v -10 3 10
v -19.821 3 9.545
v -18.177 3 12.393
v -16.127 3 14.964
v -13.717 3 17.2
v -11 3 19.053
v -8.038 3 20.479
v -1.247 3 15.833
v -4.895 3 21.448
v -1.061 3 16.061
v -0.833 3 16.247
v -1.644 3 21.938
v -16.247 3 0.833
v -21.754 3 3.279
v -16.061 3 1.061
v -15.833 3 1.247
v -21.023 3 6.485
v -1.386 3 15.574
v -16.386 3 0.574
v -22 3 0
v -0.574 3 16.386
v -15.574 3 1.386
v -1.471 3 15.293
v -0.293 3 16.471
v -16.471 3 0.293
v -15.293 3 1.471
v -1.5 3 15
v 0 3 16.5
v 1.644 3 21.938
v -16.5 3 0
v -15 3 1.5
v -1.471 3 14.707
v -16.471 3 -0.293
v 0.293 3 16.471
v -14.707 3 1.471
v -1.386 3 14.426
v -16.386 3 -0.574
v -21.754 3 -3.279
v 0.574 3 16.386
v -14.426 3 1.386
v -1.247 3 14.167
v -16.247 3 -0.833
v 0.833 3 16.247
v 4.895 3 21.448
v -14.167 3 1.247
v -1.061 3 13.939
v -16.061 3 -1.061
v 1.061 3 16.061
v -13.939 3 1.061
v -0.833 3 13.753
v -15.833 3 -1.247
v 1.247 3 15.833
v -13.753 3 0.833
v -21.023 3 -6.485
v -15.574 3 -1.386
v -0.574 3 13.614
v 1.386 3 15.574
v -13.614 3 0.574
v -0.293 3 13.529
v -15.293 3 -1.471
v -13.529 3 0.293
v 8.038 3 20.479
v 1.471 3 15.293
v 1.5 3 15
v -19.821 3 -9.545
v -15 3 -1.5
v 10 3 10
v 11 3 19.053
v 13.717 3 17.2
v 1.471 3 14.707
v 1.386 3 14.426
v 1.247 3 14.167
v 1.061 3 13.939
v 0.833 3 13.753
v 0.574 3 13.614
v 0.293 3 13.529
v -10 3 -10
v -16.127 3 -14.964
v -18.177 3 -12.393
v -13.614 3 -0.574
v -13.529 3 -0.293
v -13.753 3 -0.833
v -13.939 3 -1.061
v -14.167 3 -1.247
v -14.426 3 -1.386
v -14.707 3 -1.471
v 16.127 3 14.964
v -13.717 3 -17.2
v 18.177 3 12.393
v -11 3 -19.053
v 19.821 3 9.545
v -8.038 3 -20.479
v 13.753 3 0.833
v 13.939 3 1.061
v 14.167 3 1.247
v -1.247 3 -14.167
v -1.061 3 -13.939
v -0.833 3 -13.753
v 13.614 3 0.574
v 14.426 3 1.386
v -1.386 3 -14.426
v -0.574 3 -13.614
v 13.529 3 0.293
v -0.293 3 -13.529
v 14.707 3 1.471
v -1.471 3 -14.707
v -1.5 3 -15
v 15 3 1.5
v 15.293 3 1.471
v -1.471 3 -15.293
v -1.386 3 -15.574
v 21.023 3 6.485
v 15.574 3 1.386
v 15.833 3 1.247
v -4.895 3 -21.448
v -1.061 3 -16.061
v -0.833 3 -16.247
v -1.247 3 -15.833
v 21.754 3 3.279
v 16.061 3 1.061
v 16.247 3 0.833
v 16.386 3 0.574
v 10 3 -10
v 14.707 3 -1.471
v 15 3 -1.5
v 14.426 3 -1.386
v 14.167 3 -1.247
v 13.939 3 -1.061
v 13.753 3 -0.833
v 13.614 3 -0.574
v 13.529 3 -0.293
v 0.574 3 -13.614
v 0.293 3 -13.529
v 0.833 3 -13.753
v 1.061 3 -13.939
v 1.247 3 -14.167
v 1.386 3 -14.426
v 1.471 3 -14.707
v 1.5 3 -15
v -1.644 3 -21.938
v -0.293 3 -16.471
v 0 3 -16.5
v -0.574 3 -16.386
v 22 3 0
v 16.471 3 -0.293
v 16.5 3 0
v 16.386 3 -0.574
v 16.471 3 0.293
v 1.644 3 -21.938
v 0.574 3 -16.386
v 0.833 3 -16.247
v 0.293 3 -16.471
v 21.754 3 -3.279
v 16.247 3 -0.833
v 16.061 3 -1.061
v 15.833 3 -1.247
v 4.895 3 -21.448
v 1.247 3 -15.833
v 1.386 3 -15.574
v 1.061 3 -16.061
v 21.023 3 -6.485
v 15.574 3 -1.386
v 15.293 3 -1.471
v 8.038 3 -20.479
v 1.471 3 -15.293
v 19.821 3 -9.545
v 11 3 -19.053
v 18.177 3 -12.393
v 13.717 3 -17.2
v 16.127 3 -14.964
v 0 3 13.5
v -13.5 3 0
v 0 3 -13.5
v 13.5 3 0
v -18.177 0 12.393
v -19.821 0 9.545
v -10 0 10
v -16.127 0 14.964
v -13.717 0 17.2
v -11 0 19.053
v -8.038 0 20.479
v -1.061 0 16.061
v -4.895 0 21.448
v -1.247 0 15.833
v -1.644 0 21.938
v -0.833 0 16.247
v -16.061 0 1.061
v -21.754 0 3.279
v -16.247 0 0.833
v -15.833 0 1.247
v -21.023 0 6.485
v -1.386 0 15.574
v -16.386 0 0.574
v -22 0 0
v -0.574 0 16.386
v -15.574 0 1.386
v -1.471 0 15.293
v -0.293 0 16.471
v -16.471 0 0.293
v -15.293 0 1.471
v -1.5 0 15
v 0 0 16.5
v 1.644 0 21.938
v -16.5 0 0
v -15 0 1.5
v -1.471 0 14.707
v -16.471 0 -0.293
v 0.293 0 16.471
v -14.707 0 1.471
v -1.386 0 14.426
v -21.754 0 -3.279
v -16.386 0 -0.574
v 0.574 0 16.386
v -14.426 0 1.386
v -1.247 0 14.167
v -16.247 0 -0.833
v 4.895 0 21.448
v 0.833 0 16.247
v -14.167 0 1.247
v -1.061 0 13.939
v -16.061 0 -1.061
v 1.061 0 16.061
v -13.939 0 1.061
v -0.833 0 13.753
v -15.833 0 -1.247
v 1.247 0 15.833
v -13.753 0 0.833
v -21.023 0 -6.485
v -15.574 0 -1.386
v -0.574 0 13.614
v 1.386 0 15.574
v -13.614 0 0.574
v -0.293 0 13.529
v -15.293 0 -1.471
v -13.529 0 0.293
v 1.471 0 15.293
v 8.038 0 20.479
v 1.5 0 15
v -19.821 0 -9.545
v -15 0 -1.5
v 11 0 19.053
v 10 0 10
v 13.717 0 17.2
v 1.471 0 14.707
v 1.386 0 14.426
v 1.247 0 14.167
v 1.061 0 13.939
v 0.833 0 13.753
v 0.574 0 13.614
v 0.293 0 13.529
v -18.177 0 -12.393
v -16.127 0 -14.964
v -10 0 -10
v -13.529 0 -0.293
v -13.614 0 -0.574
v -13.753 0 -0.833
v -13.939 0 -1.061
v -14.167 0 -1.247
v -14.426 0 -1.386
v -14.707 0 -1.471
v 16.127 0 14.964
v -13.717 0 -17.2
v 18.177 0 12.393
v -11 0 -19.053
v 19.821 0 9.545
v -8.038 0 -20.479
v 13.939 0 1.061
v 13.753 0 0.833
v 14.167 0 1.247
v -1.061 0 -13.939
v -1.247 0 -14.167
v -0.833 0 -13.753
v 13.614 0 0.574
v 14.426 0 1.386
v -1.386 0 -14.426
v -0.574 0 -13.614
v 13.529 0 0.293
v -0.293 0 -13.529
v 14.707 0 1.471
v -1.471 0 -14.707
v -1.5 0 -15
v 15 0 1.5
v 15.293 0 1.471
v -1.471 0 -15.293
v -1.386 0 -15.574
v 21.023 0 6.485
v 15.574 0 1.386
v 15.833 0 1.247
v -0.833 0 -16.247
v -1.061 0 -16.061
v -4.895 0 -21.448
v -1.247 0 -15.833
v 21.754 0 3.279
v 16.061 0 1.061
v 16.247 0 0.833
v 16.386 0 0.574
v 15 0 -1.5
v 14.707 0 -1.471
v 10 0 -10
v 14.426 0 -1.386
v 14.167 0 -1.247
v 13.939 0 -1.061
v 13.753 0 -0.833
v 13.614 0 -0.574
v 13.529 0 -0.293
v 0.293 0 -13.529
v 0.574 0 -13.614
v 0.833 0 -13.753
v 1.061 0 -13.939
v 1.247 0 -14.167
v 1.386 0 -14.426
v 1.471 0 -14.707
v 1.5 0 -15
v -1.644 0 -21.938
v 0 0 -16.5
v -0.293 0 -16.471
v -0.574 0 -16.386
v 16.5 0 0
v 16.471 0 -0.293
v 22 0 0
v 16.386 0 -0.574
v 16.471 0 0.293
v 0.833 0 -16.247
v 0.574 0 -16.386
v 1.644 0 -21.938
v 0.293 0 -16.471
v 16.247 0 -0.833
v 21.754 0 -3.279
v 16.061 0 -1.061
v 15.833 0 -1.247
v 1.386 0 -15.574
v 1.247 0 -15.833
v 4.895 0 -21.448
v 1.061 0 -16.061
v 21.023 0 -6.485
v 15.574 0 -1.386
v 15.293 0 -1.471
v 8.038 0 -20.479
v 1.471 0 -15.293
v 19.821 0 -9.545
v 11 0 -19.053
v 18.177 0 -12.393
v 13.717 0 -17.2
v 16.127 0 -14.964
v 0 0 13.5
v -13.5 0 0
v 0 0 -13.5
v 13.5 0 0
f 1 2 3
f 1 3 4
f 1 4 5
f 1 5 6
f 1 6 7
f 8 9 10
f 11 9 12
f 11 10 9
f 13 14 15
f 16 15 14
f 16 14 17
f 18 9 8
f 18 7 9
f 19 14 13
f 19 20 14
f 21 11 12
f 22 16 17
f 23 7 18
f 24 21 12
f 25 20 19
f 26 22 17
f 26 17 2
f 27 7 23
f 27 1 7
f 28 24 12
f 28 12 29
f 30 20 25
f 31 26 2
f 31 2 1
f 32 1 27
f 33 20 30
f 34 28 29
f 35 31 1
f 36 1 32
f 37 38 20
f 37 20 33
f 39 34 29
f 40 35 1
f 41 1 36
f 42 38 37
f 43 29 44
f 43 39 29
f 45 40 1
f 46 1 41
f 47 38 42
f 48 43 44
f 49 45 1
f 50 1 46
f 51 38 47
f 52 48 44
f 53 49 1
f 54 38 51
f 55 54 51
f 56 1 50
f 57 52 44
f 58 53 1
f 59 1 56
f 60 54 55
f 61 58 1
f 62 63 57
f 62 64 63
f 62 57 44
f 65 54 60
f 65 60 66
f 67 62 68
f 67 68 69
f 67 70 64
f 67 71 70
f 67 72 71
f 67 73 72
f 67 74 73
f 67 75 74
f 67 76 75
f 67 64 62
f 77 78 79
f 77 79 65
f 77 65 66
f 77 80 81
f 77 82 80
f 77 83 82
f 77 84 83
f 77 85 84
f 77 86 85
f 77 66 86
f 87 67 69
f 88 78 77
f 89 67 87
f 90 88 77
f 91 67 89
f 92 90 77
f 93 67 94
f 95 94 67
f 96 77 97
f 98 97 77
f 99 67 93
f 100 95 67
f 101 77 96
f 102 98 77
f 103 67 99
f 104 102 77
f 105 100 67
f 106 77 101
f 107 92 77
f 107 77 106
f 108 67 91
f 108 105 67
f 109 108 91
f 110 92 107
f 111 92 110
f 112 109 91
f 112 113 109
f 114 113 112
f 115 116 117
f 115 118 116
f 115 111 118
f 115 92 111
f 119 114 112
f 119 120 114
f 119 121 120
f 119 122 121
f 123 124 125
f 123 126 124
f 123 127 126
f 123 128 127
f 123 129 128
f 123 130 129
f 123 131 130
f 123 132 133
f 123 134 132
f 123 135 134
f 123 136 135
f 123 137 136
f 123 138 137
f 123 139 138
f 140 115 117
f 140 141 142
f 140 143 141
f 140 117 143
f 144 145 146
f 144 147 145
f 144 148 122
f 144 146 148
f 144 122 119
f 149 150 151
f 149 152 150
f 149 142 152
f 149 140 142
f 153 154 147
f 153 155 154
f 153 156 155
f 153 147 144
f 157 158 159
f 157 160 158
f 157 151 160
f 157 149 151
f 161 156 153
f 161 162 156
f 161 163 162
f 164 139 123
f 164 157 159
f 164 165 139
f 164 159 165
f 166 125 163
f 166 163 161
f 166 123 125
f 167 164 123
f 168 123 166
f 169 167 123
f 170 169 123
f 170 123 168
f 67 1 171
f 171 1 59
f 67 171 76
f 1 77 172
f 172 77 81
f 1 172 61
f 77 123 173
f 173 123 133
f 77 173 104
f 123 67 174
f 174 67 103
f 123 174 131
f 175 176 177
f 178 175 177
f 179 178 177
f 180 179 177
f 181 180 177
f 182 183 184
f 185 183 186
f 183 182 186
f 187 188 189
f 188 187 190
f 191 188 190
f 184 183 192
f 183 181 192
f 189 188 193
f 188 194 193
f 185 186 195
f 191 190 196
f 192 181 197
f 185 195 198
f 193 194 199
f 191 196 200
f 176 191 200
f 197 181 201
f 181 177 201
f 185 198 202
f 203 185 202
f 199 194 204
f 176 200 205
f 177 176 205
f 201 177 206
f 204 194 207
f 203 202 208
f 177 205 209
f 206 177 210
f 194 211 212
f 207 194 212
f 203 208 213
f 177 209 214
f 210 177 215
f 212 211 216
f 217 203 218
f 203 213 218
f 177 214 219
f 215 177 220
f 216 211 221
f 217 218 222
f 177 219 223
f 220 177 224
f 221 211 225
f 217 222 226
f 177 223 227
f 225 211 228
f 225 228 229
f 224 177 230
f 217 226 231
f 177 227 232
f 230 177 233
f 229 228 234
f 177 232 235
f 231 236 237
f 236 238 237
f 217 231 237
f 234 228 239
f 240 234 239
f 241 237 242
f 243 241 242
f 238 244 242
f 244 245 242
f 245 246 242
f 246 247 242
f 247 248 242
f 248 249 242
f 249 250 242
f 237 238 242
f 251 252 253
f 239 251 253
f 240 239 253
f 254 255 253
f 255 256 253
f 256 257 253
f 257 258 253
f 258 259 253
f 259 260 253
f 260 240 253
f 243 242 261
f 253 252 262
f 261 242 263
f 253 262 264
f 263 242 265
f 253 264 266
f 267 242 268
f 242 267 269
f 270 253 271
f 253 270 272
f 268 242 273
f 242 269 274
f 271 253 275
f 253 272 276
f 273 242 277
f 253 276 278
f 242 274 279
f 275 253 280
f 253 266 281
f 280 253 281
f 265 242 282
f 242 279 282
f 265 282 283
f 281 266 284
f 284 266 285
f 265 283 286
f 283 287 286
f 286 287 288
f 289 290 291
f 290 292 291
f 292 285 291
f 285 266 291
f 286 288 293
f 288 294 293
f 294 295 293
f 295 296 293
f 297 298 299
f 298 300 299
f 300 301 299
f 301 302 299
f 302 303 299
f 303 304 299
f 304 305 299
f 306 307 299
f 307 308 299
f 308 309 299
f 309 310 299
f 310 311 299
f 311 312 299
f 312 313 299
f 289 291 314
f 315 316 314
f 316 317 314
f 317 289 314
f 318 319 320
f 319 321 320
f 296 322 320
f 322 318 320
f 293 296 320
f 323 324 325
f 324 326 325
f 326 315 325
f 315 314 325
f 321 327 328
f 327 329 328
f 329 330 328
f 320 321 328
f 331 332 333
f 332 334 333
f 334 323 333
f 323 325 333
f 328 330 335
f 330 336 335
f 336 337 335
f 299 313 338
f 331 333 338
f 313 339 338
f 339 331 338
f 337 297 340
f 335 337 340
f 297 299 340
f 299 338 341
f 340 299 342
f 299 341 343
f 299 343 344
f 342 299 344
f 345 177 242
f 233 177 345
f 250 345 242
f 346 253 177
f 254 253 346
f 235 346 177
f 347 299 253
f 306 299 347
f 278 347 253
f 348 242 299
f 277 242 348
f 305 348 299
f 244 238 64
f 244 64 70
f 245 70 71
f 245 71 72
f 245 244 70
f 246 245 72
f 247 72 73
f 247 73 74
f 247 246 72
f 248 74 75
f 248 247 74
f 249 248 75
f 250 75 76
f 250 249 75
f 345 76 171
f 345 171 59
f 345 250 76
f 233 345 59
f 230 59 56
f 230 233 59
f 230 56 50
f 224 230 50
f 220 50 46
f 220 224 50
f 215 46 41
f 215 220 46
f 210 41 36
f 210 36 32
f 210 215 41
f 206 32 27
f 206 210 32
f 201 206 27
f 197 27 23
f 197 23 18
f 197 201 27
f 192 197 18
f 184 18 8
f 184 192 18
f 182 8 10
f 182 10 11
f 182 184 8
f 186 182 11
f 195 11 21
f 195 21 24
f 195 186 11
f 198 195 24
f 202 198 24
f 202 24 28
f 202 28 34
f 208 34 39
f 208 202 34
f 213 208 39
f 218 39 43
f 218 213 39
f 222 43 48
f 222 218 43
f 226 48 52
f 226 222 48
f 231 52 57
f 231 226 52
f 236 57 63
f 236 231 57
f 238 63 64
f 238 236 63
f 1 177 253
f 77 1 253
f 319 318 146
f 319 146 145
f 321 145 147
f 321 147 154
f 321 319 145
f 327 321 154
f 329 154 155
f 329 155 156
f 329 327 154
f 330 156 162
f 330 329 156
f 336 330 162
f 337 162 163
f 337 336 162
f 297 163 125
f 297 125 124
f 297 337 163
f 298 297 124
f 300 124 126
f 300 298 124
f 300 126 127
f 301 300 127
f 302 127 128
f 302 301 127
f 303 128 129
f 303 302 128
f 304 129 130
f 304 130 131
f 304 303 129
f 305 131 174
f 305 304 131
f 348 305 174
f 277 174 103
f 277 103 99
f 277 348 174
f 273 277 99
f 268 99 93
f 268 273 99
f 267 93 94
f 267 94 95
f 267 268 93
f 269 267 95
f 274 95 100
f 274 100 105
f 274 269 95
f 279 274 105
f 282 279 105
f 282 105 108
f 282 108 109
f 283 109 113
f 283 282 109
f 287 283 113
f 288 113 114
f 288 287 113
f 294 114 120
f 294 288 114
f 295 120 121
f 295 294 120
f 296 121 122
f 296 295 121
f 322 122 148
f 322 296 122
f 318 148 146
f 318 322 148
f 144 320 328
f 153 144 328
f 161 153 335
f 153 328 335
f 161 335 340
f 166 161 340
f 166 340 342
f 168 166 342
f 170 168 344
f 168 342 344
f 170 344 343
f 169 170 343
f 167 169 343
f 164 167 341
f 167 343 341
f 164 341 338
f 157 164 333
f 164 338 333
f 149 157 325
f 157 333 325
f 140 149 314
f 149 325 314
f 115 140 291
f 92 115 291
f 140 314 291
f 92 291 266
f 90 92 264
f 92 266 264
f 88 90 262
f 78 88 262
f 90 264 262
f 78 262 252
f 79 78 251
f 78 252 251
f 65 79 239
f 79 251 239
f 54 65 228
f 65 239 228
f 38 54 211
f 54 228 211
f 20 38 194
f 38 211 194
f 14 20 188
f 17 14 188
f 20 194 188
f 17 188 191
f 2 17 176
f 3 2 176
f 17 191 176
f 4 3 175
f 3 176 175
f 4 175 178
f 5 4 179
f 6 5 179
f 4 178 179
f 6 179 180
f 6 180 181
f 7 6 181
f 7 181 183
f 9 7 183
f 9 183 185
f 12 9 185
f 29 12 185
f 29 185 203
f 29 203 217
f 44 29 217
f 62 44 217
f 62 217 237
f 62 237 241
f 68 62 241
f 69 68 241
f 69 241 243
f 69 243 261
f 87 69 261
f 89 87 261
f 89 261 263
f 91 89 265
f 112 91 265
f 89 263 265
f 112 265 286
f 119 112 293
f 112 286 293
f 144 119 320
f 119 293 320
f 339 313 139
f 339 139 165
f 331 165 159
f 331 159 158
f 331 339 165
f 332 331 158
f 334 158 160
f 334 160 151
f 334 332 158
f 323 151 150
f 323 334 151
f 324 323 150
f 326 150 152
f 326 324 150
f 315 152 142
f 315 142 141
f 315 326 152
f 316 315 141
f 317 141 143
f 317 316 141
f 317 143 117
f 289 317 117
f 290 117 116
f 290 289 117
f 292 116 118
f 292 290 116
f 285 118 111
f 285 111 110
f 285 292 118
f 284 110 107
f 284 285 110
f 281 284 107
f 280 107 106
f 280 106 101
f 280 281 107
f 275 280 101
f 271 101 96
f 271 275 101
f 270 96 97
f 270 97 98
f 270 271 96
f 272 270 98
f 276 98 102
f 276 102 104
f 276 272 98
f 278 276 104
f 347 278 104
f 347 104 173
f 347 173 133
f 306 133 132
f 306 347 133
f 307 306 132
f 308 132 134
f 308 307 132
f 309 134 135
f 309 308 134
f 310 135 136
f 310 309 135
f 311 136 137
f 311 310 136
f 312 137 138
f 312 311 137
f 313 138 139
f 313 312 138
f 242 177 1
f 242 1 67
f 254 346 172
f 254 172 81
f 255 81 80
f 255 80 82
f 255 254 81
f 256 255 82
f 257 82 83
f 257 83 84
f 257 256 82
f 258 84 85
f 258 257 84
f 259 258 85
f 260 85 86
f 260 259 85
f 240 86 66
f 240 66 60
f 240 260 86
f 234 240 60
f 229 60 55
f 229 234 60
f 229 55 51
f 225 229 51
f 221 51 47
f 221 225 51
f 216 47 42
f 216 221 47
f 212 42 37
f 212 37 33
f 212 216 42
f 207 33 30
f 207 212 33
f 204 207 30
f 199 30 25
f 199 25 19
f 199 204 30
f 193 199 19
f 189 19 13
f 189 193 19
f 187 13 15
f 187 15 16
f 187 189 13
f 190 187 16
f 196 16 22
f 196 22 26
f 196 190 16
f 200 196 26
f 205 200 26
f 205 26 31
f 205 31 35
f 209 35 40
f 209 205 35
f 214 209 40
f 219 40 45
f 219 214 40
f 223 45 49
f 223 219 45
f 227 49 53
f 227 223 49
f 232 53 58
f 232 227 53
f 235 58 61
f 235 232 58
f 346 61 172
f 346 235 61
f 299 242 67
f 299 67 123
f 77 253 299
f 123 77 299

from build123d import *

# Parameters (mm, degrees)
SKETCH1_R           = 22
SKETCH1_R_2         = 1.5
SKETCH1_W           = 20
SKETCH1_H           = 20
BOSS_EXTRUDE1_DEPTH = 3


with BuildPart() as part:
    # Sketch1 → Boss-Extrude1 (new body)
    with BuildSketch(Plane(origin=(0, 0, 0), x_dir=(1, 0, 0), z_dir=(0, 1, 0))):
        Circle(SKETCH1_R)
        with Locations((-15, 0)):
            Circle(SKETCH1_R_2, mode=Mode.SUBTRACT)
        with Locations((0, 15)):
            Circle(SKETCH1_R_2, mode=Mode.SUBTRACT)
        with Locations((15, 0)):
            Circle(SKETCH1_R_2, mode=Mode.SUBTRACT)
        with Locations((0, -15)):
            Circle(SKETCH1_R_2, mode=Mode.SUBTRACT)
        Rectangle(SKETCH1_W, SKETCH1_H, mode=Mode.SUBTRACT)
    extrude(amount=BOSS_EXTRUDE1_DEPTH)


solid = part.part
